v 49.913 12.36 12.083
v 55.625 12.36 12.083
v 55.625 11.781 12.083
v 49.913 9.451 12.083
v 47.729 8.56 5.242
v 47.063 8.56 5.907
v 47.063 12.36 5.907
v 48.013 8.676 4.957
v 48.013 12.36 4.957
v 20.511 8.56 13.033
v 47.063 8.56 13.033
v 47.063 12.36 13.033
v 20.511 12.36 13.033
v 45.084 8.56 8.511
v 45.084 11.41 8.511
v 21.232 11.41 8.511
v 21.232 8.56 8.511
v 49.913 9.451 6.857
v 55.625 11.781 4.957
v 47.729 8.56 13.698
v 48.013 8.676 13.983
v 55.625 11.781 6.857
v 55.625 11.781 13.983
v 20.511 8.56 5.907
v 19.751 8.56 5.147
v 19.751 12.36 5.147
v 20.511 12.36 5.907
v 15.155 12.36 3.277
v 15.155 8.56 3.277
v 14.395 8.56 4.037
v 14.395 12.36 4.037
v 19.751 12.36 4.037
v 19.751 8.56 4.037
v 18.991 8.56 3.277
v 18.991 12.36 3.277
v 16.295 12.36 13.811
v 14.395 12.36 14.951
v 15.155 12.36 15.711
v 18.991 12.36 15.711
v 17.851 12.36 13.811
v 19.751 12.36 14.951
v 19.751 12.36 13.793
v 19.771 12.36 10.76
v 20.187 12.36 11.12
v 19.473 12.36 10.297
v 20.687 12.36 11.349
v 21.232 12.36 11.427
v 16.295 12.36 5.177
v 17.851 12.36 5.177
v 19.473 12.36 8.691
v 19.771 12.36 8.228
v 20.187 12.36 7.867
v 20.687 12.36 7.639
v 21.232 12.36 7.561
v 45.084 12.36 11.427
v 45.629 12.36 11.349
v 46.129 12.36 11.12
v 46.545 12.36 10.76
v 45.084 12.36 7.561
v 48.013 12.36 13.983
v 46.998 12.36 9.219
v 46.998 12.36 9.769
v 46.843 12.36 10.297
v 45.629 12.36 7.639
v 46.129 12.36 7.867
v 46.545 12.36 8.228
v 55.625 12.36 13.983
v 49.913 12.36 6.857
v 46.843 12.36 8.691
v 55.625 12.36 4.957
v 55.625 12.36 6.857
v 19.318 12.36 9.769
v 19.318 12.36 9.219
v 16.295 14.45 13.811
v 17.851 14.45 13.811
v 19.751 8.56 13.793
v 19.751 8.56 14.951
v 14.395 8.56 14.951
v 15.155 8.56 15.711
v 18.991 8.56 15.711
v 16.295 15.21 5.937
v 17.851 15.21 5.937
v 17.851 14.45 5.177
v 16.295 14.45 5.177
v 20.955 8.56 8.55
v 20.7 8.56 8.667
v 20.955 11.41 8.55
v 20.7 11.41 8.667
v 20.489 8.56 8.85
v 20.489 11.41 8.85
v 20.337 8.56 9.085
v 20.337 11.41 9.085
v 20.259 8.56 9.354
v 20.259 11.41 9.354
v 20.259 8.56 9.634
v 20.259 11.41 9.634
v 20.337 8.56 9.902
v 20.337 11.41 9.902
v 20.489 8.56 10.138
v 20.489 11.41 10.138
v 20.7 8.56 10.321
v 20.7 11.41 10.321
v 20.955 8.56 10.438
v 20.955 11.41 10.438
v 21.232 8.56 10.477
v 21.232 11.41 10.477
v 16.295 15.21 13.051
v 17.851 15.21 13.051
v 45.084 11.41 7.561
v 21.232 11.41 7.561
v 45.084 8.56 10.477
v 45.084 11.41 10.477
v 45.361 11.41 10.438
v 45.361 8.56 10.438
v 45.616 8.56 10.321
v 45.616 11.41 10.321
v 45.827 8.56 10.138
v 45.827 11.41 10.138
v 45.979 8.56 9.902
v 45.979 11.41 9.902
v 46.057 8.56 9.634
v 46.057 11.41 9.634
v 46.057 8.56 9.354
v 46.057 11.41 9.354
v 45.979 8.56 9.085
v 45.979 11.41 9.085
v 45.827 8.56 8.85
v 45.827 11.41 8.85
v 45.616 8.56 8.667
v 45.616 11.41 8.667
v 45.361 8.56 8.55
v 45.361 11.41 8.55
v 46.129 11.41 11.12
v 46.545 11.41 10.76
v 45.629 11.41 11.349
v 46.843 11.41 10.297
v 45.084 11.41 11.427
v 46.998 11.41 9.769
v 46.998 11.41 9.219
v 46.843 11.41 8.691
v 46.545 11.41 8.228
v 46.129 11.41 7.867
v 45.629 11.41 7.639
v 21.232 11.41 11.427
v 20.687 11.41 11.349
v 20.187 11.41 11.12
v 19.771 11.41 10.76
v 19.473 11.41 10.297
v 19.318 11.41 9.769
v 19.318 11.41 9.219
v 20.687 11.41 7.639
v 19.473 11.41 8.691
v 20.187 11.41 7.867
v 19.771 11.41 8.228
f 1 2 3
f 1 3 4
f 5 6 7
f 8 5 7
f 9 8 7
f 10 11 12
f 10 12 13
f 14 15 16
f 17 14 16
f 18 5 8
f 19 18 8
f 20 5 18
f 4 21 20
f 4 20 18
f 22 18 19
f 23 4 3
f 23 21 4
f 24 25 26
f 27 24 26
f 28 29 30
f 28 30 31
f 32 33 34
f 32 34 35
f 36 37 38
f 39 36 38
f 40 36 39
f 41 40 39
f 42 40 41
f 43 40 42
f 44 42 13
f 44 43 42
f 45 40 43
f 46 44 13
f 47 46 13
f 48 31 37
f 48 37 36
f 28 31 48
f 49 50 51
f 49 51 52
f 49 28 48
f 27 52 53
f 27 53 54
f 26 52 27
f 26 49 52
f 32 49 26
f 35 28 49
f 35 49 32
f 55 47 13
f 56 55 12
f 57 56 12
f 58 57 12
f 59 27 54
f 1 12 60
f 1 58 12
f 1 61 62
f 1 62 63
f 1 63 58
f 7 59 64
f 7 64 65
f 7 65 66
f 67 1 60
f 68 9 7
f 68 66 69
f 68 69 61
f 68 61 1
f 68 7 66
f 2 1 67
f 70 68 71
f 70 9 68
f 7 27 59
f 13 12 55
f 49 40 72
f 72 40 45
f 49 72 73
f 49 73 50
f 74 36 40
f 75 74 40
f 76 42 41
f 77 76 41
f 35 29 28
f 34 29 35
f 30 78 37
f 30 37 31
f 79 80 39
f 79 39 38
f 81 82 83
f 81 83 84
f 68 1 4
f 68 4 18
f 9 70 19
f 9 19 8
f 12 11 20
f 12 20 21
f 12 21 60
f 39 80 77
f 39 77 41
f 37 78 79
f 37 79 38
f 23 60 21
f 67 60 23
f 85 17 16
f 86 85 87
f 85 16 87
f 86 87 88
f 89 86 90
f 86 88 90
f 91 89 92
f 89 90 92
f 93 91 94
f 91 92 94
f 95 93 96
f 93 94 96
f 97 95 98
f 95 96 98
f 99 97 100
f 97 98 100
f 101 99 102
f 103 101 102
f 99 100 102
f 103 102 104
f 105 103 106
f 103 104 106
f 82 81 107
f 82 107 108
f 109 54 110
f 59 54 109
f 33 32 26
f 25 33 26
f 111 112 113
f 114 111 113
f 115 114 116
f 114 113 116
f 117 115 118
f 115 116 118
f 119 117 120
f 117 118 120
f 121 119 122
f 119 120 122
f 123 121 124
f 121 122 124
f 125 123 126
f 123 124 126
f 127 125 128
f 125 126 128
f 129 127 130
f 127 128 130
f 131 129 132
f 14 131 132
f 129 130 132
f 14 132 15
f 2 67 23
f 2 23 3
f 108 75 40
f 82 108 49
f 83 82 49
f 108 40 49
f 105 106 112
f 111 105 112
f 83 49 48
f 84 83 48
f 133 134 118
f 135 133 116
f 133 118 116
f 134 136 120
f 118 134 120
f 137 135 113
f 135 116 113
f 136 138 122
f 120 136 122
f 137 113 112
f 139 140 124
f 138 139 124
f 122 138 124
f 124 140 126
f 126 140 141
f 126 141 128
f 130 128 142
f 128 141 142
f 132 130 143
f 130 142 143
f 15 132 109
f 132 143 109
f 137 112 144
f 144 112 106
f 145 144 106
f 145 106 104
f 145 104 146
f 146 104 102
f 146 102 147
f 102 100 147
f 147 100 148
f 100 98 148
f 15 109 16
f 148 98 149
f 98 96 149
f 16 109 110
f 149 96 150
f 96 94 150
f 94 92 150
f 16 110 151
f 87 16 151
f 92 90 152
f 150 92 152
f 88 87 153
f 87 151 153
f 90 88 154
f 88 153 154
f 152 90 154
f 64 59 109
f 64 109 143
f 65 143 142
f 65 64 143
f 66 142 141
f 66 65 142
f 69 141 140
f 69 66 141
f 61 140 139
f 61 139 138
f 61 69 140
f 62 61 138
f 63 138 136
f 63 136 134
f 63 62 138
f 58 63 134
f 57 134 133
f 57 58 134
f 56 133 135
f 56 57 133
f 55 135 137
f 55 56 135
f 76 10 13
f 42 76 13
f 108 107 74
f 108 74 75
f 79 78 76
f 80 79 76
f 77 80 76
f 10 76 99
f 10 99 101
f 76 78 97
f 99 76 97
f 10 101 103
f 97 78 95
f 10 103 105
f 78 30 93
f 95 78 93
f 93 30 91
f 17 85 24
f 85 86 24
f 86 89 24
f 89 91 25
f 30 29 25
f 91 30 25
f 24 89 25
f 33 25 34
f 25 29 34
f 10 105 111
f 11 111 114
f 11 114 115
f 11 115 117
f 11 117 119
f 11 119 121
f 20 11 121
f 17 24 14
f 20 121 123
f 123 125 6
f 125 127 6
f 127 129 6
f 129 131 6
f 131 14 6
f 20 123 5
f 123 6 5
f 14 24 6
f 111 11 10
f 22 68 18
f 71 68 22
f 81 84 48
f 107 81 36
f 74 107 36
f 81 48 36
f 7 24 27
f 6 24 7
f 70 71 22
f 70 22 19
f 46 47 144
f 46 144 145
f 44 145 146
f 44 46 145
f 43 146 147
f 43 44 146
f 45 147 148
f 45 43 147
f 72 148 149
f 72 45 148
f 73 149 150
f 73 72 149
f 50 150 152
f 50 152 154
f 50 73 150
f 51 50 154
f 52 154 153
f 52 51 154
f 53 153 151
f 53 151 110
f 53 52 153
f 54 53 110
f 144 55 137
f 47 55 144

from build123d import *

# Parameters (mm, degrees)
BOSS_EXTRUDE1_DEPTH = 20
CUT_EXTRUDE1_DEPTH  = 5
CUT_EXTRUDE2_DEPTH  = 132.297386022
CHAMFER1_SIZE       = 4
BOSS_EXTRUDE2_DEPTH = 15
CHAMFER2_SIZE       = 4
BOSS_EXTRUDE3_DEPTH = 20
CHAMFER3_SIZE       = 5
CUT_EXTRUDE3_DEPTH  = 60
SCALE2_SCALE        = 0.19


with BuildPart() as part:
    # Sketch1 → Boss-Extrude1 (new body)
    with BuildSketch(Plane(origin=(0, 0, 0), x_dir=(1, 0, 0), z_dir=(0, 1, 0))):
        Polygon((-26.074130493, -28.215811716), (-26.074130493, -42.310360901), (-54.263228862, -42.310360901), (-54.263228862, 23.128617456), (-26.074130493, 23.128617456), (-26.074130493, 9.28575665), (122.67370108, 9.28575665), (122.67370108, -28.215811716), align=None)
    extrude(amount=BOSS_EXTRUDE1_DEPTH)

    # Sketch2 → Cut-Extrude1 (cut)
    with BuildSketch(Plane(origin=(0, 20, 0), x_dir=(1, 0, 0), z_dir=(0, 1, 0))):
        with BuildLine():
            Line((-18.280512059, 0.584936596), (107.256828457, 0.584936596))
            ThreePointArc((107.256828457, 0.584936596), (117.432636776, -9.590871723), (107.256828457, -19.766680041))
            Line((107.256828457, -19.766680041), (-18.280512059, -19.766680041))
            ThreePointArc((-18.280512059, -19.766680041), (-28.456320377, -9.590871723), (-18.280512059, 0.584936596))
        make_face()
        with BuildLine():
            Line((-18.280512059, -4.415063404), (107.256828457, -4.415063404))
            ThreePointArc((107.256828457, -4.415063404), (112.432636776, -9.590871723), (107.256828457, -14.766680041))
            Line((107.256828457, -14.766680041), (-18.280512059, -14.766680041))
            ThreePointArc((-18.280512059, -14.766680041), (-23.456320377, -9.590871723), (-18.280512059, -4.415063404))
        make_face(mode=Mode.SUBTRACT)
    extrude(amount=-CUT_EXTRUDE1_DEPTH, mode=Mode.SUBTRACT)

    # Sketch3 → Cut-Extrude2 (cut, through all)
    with BuildSketch(Plane(origin=(0, 20, 0), x_dir=(1, 0, 0), z_dir=(0, 1, 0))):
        with BuildLine():
            Line((-18.280512059, -14.766680041), (107.256828457, -14.766680041))
            ThreePointArc((107.256828457, -14.766680041), (112.432636776, -9.590871723), (107.256828457, -4.415063404))
            Line((107.256828457, -4.415063404), (-18.280512059, -4.415063404))
            ThreePointArc((-18.280512059, -4.415063404), (-23.456320377, -9.590871723), (-18.280512059, -14.766680041))
        make_face()
    extrude(amount=-CUT_EXTRUDE2_DEPTH, mode=Mode.SUBTRACT)

    # Chamfer1
    chamfer1_edges = [part.edges().sort_by_distance(p)[0] for p in [
        (-26.074130493, 10, 28.215811716),
        (-26.074130493, 10, -9.28575665),
        (-26.074130493, 10, -23.128617456),
        (-54.263228862, 10, -23.128617456),
        (-54.263228862, 10, 42.310360901),
        (-26.074130493, 10, 42.310360901),
    ]]
    chamfer(chamfer1_edges, length=CHAMFER1_SIZE)

    # Sketch4 → Boss-Extrude2 (add)
    with BuildSketch(Plane(origin=(0, 20, 0), x_dir=(1, 0, 0), z_dir=(0, 1, 0))):
        Polygon((-36.074130493, -32.215811716), (-36.074130493, 13.128617456), (-44.263228862, 13.128617456), (-44.263228862, -32.310360901), (-36.074130493, -32.310360901), align=None)
    extrude(amount=BOSS_EXTRUDE2_DEPTH)

    # Chamfer2
    chamfer2_edges = [part.edges().sort_by_distance(p)[0] for p in [
        (-40.168679677, 35, -13.128617456),
        (-40.168679677, 35, 32.310360901),
    ]]
    chamfer(chamfer2_edges, length=CHAMFER2_SIZE)

    # Sketch5 → Boss-Extrude3 (add)
    with BuildSketch(Plane(origin=(0, 20, 0), x_dir=(1, 0, 0), z_dir=(0, 1, 0))):
        Polygon((122.67370108, -33.215811716), (162.735602204, -33.215811716), (162.735602204, -23.215811716), (132.67370108, -23.215811716), (132.67370108, 4.28575665), (162.735602204, 4.28575665), (162.735602204, 14.28575665), (122.67370108, 14.28575665), align=None)
    extrude(amount=-BOSS_EXTRUDE3_DEPTH)

    # Chamfer3
    chamfer3_edges = [part.edges().sort_by_distance(p)[0] for p in [
        (122.67370108, 10, -9.28575665),
        (122.67370108, 10, 28.215811716),
    ]]
    chamfer(chamfer3_edges, length=CHAMFER3_SIZE - 0.0001)  # a hair under: the kernel refuses the full size

    # Sketch6 → Cut-Extrude3 (cut)
    with BuildSketch(Plane.XY.offset(33.215811716)):
        Polygon((120.800441338, -0.153311602), (162.735602204, 16.953910153), (162.735602204, 0), align=None)
    extrude(amount=-CUT_EXTRUDE3_DEPTH, mode=Mode.SUBTRACT)


with BuildPart() as part_1:
    # Scale2: scaled about (30.500255958, 10.567938769, 9.471238373)
    add(part.part.scale(SCALE2_SCALE).moved(Location((24.705207326, 8.560030403, 7.671703082))))


solid = part_1.part
